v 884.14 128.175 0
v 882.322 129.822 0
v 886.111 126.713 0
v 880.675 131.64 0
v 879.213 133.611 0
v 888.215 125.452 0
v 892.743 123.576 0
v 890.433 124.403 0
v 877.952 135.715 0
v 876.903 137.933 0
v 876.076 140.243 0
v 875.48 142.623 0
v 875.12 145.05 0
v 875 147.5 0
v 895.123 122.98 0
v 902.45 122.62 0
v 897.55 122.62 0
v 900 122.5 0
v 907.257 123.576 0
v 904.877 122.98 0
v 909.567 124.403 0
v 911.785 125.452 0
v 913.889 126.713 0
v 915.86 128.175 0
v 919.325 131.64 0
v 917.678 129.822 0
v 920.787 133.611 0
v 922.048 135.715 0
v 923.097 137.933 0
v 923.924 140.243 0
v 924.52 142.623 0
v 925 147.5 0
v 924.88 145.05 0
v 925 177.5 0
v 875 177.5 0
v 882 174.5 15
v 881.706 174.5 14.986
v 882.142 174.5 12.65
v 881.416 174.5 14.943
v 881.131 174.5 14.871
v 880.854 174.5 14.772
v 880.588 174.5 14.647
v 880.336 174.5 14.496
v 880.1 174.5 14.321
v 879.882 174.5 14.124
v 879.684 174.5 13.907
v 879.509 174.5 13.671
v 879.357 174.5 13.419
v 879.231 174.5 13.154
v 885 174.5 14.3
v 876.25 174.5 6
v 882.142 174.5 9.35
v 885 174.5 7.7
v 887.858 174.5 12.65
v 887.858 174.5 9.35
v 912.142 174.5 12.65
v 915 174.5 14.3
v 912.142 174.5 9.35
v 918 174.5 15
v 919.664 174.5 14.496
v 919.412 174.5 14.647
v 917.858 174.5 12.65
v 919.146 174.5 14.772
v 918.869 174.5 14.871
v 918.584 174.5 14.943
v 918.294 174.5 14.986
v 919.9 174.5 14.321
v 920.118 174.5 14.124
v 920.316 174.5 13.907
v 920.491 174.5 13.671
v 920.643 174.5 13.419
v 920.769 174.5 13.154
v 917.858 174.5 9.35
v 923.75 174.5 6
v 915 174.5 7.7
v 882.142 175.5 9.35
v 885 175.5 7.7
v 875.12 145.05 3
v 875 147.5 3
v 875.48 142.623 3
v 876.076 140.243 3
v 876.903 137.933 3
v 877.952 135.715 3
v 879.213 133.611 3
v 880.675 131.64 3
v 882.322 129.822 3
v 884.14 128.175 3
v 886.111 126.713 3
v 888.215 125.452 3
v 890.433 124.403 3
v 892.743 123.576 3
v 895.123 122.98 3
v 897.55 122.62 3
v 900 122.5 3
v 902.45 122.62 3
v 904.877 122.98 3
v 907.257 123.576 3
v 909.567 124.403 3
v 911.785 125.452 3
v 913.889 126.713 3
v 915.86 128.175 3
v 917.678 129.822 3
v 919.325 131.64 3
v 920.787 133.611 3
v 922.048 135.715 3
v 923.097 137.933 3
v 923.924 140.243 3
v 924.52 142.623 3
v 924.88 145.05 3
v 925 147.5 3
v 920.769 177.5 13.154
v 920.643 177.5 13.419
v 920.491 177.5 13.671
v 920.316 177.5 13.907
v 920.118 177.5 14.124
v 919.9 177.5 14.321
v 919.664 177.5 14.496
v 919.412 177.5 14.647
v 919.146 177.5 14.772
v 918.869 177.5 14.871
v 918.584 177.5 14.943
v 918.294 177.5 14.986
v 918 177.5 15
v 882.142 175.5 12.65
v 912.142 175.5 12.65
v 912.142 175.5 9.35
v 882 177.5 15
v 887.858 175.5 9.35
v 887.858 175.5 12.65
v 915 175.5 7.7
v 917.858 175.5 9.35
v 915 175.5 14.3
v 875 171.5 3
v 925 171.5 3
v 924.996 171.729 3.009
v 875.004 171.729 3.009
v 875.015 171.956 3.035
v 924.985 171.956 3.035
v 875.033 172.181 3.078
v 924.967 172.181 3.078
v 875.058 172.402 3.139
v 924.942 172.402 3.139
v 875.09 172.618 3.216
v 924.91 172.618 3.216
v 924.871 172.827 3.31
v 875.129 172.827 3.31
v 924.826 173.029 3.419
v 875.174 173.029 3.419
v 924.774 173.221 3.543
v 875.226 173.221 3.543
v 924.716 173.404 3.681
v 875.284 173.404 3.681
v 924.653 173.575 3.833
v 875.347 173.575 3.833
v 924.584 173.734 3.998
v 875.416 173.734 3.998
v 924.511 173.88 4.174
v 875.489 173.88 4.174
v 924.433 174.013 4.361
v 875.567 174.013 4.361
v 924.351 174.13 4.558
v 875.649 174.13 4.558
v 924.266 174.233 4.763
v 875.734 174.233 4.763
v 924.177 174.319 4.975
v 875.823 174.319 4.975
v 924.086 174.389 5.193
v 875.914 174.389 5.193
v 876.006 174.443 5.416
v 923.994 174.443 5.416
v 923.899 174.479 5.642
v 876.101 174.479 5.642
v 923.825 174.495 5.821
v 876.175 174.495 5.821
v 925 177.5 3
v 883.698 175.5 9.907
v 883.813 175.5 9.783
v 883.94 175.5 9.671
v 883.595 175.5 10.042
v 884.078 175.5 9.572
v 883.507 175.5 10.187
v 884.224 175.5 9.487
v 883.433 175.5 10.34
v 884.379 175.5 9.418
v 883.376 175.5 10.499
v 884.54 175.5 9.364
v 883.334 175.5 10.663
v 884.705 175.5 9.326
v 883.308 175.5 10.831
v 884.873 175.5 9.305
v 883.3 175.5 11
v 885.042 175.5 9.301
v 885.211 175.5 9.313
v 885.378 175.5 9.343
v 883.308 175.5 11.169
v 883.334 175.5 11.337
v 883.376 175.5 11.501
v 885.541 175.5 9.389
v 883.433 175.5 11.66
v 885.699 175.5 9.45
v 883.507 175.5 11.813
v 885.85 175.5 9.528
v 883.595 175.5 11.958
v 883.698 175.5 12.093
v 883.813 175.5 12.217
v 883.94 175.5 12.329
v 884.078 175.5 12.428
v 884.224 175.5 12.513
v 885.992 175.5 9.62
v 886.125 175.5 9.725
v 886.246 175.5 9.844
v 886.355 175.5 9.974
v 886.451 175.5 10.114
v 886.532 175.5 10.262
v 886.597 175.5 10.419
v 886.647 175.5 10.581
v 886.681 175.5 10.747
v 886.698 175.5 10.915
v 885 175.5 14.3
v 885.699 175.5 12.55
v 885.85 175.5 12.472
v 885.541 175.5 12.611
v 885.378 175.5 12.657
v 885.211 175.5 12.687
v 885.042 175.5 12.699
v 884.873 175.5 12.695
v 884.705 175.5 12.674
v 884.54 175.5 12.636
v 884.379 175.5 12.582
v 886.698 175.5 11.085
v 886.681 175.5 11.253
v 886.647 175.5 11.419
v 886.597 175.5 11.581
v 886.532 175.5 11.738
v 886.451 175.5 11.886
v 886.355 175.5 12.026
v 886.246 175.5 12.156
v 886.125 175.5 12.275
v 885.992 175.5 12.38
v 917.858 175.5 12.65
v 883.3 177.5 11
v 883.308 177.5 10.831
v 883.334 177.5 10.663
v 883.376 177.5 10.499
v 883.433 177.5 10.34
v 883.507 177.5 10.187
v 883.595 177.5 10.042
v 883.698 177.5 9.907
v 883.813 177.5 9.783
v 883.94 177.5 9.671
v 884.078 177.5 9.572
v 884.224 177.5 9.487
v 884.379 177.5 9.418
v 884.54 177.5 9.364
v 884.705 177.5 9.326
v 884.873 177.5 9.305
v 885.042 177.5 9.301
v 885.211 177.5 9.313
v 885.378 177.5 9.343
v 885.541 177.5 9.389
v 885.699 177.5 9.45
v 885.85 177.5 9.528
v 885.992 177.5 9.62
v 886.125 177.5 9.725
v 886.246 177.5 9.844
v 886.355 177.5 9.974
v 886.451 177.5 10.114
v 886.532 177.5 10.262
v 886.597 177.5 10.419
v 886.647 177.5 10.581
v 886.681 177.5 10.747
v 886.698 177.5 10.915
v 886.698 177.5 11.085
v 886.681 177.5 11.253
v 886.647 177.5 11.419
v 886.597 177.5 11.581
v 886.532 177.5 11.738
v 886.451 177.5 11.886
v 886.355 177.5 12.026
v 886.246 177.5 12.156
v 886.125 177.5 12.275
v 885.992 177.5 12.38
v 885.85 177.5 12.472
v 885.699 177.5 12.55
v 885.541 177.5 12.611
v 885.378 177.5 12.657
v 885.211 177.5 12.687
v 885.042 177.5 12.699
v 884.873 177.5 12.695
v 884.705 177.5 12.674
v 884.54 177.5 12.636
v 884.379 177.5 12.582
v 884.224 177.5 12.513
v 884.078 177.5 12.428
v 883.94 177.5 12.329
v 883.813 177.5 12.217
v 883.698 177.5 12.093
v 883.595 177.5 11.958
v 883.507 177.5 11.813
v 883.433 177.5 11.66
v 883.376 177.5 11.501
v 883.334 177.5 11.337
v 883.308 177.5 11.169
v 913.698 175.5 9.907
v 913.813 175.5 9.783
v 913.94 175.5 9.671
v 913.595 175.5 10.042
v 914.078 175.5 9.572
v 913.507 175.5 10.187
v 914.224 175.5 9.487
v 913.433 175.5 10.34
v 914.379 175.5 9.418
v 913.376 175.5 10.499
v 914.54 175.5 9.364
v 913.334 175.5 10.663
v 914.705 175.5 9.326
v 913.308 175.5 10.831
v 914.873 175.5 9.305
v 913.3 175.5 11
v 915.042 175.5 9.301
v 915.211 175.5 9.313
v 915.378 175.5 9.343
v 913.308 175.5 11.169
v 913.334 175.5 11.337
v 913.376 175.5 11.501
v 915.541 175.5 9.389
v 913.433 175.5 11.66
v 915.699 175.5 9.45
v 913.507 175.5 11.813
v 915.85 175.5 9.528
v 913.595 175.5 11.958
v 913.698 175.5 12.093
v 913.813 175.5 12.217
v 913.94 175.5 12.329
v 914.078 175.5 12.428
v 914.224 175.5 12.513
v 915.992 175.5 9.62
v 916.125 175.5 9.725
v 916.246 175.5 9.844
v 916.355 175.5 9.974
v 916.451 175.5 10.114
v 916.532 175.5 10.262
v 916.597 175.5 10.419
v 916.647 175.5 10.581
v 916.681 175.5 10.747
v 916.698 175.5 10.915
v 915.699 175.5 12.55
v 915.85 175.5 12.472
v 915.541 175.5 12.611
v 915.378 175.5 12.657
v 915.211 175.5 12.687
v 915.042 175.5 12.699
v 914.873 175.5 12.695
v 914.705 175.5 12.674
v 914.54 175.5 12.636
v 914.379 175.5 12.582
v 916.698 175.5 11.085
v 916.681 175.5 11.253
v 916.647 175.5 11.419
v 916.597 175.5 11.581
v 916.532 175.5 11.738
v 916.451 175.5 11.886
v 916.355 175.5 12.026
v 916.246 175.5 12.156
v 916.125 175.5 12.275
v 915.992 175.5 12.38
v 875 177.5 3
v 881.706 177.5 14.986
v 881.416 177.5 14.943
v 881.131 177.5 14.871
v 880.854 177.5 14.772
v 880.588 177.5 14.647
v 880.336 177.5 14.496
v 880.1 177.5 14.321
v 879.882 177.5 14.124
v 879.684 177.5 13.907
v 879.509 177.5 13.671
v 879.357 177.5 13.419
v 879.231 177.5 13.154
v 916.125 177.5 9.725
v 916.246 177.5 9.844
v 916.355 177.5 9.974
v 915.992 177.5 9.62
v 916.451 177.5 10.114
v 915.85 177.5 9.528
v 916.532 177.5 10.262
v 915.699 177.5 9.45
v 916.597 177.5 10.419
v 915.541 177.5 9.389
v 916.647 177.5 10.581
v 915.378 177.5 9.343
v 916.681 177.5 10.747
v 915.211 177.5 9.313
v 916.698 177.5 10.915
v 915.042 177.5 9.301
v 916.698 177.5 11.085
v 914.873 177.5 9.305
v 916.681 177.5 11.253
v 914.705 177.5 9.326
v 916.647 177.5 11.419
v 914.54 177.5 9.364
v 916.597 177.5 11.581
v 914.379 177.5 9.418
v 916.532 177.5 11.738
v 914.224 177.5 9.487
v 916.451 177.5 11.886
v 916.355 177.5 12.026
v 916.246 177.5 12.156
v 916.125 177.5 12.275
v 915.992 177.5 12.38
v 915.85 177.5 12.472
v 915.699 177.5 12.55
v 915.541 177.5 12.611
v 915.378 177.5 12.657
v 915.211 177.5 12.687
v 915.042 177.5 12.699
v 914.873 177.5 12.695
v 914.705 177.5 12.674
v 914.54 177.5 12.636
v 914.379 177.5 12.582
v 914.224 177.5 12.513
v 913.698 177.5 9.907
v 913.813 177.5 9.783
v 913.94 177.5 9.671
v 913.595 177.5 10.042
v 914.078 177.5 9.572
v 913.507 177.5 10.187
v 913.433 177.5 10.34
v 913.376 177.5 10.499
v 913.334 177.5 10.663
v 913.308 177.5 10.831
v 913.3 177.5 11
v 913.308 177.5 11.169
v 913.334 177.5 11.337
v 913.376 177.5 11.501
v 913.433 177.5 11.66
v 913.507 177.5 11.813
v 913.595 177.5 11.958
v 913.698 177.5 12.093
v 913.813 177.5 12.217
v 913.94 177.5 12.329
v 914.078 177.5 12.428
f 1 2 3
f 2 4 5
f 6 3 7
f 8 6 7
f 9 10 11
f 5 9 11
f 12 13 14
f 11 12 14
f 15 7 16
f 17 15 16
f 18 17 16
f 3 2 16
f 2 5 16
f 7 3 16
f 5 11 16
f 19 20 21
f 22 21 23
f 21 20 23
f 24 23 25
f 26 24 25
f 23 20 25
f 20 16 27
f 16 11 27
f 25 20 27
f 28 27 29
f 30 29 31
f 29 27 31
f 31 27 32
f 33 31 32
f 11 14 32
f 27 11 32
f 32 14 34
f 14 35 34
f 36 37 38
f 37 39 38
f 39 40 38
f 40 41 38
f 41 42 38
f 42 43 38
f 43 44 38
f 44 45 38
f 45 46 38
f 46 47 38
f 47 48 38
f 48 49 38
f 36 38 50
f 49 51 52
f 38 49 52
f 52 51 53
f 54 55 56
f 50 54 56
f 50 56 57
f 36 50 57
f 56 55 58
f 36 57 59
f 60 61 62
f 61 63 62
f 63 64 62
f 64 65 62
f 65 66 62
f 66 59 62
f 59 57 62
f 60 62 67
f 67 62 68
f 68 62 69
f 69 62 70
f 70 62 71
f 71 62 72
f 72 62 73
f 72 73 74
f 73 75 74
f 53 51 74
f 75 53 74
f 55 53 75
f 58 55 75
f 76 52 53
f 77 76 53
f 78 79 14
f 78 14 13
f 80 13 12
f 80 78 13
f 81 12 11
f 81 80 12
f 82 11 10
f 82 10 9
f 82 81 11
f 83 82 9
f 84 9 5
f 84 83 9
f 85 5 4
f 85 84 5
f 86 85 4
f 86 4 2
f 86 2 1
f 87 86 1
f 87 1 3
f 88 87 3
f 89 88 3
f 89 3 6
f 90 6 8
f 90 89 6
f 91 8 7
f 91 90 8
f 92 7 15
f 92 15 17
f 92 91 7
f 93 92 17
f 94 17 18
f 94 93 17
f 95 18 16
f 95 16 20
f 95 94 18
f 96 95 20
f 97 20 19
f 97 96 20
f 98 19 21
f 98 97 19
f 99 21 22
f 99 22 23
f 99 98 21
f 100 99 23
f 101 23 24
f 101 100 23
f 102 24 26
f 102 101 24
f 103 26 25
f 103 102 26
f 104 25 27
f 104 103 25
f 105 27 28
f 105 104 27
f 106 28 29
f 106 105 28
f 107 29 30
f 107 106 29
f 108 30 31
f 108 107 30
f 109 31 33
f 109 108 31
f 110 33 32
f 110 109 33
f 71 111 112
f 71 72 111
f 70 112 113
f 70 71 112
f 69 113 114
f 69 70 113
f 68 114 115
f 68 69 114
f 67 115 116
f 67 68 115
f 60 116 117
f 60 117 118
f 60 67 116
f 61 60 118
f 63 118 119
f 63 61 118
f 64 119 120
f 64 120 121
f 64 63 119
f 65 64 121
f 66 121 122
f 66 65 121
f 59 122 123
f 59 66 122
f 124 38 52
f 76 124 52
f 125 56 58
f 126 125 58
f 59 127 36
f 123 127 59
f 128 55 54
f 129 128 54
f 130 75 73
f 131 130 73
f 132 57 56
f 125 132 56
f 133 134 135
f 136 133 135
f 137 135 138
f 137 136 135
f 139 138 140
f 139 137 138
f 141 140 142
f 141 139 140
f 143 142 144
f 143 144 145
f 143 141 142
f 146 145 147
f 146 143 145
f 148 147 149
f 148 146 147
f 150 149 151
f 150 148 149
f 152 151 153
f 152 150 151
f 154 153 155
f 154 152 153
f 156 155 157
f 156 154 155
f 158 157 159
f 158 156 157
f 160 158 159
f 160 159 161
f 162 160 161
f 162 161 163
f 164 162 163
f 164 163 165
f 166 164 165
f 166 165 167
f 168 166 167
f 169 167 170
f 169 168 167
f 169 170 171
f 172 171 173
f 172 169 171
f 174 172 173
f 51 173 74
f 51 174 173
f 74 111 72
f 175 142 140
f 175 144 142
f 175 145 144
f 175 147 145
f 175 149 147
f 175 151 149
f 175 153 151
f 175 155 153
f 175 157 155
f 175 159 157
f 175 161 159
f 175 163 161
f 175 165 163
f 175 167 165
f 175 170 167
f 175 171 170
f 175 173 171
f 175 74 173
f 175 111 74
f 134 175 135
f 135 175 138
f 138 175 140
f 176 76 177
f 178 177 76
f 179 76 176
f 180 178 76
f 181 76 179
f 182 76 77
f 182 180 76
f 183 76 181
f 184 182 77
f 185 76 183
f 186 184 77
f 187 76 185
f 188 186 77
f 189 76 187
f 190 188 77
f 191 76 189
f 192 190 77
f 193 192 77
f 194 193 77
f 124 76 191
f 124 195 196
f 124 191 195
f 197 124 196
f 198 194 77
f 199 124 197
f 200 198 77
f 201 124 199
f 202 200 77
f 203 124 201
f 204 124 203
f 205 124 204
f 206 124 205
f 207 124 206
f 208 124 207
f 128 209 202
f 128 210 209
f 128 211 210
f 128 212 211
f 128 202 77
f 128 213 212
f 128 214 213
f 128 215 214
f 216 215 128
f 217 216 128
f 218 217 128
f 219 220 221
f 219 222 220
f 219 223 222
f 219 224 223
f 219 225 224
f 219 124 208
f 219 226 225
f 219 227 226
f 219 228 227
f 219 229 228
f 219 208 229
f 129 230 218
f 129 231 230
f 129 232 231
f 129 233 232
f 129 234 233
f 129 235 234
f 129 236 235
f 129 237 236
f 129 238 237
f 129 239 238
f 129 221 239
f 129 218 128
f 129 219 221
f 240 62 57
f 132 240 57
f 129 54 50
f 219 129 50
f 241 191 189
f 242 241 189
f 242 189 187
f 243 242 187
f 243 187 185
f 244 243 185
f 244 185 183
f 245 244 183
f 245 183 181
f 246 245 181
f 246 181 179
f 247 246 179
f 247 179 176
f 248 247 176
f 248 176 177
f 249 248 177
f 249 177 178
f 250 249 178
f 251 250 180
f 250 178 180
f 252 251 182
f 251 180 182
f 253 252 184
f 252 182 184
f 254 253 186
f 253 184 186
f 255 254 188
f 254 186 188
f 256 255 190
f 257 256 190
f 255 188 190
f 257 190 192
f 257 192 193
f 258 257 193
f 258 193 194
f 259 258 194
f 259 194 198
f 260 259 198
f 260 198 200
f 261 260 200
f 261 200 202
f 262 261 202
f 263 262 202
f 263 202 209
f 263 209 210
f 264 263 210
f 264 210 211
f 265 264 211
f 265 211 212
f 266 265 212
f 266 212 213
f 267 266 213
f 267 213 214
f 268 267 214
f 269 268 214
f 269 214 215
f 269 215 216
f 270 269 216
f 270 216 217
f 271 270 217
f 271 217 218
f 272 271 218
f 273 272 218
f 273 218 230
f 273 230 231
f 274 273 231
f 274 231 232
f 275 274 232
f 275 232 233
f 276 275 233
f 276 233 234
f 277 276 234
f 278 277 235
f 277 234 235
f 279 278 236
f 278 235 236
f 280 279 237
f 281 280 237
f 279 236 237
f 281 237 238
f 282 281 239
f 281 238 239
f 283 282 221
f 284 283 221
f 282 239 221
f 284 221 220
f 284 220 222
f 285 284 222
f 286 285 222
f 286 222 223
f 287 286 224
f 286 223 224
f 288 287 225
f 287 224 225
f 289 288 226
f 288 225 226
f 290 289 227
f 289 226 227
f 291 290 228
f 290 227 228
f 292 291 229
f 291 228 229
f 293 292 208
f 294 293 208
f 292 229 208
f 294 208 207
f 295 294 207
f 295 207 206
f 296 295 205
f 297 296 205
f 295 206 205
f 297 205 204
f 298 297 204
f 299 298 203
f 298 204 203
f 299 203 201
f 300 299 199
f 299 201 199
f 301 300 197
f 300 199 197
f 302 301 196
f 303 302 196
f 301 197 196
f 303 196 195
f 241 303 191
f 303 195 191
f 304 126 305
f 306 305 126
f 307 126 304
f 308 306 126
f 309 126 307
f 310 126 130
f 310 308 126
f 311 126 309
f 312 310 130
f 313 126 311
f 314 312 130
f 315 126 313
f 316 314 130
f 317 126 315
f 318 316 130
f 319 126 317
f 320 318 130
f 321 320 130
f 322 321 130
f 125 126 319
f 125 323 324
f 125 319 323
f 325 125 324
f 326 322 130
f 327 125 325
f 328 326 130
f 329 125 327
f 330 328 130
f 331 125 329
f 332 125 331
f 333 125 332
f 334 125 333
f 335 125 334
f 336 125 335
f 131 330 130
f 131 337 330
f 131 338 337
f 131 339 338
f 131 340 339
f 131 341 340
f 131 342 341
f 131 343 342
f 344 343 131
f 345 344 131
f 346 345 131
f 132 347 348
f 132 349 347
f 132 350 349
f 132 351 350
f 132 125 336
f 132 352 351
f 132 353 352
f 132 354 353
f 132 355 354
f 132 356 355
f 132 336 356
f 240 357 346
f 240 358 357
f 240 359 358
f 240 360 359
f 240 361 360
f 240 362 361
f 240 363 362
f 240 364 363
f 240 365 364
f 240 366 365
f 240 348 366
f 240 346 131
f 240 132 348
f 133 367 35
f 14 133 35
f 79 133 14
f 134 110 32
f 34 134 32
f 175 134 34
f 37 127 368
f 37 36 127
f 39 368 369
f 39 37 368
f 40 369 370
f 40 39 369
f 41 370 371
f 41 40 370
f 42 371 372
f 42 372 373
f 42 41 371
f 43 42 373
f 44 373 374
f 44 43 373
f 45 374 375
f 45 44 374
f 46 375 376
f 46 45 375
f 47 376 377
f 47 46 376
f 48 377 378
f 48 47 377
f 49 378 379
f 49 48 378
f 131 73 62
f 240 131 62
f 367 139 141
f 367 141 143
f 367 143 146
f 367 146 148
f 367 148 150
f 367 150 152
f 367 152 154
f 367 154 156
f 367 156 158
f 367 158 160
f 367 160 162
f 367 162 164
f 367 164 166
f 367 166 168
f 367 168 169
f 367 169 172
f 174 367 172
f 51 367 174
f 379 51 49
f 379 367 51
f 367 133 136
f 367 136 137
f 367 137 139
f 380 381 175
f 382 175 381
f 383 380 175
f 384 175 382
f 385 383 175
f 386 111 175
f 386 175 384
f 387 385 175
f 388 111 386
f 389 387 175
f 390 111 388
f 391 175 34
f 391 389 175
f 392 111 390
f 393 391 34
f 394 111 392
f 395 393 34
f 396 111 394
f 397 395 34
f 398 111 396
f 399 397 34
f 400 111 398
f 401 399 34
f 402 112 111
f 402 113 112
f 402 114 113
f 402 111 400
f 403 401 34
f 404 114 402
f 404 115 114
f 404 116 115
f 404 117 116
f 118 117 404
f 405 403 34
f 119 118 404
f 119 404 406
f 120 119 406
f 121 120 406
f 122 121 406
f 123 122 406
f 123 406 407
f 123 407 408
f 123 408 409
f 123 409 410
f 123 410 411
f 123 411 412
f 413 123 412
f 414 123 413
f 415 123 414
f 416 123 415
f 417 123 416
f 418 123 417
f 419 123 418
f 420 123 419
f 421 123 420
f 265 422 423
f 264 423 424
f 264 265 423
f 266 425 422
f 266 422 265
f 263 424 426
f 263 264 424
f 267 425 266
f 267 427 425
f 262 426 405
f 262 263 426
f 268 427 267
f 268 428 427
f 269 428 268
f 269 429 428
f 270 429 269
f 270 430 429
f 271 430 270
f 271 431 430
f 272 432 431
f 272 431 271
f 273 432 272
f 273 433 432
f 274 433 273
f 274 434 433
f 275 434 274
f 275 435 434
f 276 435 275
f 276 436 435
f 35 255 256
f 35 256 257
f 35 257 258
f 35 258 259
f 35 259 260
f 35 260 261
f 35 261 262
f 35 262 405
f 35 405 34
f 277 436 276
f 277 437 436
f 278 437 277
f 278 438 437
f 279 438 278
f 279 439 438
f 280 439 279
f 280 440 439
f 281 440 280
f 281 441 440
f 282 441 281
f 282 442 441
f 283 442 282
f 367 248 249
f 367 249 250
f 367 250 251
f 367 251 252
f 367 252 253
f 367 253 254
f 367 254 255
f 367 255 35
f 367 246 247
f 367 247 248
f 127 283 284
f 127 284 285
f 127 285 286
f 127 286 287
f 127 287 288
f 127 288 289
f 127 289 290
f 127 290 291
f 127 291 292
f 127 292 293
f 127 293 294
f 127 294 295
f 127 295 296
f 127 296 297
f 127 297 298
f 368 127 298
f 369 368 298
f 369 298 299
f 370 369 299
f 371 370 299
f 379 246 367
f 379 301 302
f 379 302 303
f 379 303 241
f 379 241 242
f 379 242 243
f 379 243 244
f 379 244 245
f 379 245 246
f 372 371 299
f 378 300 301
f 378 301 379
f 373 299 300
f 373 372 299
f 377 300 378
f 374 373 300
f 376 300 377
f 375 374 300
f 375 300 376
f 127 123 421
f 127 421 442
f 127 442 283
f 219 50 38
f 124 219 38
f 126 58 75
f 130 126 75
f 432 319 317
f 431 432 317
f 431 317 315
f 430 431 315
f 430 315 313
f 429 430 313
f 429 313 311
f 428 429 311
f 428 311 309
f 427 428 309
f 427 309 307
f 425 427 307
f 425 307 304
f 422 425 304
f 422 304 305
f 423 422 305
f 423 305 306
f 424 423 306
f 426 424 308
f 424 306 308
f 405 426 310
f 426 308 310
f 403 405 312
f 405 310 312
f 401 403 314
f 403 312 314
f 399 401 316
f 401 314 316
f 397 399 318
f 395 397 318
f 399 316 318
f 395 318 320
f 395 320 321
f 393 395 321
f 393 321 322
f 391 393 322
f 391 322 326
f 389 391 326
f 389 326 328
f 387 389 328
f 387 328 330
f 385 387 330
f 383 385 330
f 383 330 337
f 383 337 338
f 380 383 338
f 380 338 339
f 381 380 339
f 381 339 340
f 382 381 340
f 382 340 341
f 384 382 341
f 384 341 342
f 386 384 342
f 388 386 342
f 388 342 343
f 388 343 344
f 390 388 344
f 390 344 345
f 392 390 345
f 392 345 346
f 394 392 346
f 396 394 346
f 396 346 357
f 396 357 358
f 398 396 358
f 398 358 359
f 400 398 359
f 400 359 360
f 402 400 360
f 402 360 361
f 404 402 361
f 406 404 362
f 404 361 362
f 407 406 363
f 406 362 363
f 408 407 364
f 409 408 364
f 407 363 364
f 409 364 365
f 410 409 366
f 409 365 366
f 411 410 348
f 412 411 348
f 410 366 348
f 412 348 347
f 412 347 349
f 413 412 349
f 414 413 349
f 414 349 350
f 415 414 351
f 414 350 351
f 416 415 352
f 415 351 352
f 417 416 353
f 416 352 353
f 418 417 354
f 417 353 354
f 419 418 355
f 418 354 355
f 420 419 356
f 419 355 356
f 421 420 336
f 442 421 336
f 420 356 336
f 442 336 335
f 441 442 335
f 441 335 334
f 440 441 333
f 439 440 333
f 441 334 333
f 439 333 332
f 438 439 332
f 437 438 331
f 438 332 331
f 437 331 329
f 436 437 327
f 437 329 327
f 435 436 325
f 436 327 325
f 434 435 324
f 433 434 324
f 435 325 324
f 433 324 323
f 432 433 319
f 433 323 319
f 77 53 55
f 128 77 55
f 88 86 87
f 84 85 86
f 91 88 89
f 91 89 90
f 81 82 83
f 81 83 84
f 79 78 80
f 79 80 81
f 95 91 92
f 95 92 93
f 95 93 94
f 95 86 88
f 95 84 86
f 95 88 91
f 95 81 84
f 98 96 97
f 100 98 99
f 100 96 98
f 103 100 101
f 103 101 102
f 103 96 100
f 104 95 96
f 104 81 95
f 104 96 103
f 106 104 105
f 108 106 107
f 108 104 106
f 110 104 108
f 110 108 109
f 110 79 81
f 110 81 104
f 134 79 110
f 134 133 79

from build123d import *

# Parameters (mm, degrees)
EXTRUDE_1_DEPTH             = 3
EXTRUDE_2_DEPTH             = 3
CUT_EXTRUDE_1_DEPTH         = 1
CUT_EXTRUDE_2_DEPTH         = 1
HOLE_WIZARD_3_4_3_4_1_D     = 3.4
HOLE_WIZARD_3_4_3_4_1_DEPTH = 55
FILLET_1_R                  = 3


with BuildPart() as part:
    # 草图1 → 凸台-拉伸1 (new body)
    with BuildSketch(Plane(origin=(0, 177.5, 0), x_dir=(1, 0, 0), z_dir=(0, 1, 0))):
        Polygon((920, -15), (925, -3), (875, -3), (880, -15), align=None)
    extrude(amount=-EXTRUDE_1_DEPTH)

    # 草图2 → 凸台-拉伸2 (add)
    with BuildSketch(Plane(origin=(0, 0, 3), x_dir=(-1, 0, 0), z_dir=(0, 0, -1))):
        with BuildLine():
            Line((-925, 147.5), (-925, 177.5))
            Line((-925, 177.5), (-875, 177.5))
            Line((-875, 177.5), (-875, 147.5))
            ThreePointArc((-875, 147.5), (-900, 122.5), (-925, 147.5))
        make_face()
    extrude(amount=EXTRUDE_2_DEPTH)

    # 草图3 → 切除-拉伸1 (cut)
    with BuildSketch(Plane.XZ.offset(-174.5)):
        Polygon((912.142116168, 12.65), (912.142116168, 9.35), (915, 7.7), (917.857883832, 9.35), (917.857883832, 12.65), (915, 14.3), align=None)
    extrude(amount=-CUT_EXTRUDE_1_DEPTH, mode=Mode.SUBTRACT)

    # 草图4 → 切除-拉伸2 (cut)
    with BuildSketch(Plane.XZ.offset(-174.5)):
        Polygon((882.142116168, 9.35), (885, 7.7), (887.857883832, 9.35), (887.857883832, 12.65), (885, 14.3), (882.142116168, 12.65), align=None)
    extrude(amount=-CUT_EXTRUDE_2_DEPTH, mode=Mode.SUBTRACT)

    # Ø3.4 (3.4) 直径孔1
    with Locations(Plane(origin=(0, 177.5, 0), x_dir=(1, 0, 0), z_dir=(0, 1, 0))):
        with Locations((885, -11), (915, -11)):
            Hole(HOLE_WIZARD_3_4_3_4_1_D / 2, depth=HOLE_WIZARD_3_4_3_4_1_DEPTH)

    # 圆角1
    fillet_1_edges = [part.edges().sort_by_distance(p)[0] for p in [
        (900, 174.5, 3),
        (880, 176, 15),
        (920, 176, 15),
    ]]
    fillet(fillet_1_edges, radius=FILLET_1_R)


solid = part.part
